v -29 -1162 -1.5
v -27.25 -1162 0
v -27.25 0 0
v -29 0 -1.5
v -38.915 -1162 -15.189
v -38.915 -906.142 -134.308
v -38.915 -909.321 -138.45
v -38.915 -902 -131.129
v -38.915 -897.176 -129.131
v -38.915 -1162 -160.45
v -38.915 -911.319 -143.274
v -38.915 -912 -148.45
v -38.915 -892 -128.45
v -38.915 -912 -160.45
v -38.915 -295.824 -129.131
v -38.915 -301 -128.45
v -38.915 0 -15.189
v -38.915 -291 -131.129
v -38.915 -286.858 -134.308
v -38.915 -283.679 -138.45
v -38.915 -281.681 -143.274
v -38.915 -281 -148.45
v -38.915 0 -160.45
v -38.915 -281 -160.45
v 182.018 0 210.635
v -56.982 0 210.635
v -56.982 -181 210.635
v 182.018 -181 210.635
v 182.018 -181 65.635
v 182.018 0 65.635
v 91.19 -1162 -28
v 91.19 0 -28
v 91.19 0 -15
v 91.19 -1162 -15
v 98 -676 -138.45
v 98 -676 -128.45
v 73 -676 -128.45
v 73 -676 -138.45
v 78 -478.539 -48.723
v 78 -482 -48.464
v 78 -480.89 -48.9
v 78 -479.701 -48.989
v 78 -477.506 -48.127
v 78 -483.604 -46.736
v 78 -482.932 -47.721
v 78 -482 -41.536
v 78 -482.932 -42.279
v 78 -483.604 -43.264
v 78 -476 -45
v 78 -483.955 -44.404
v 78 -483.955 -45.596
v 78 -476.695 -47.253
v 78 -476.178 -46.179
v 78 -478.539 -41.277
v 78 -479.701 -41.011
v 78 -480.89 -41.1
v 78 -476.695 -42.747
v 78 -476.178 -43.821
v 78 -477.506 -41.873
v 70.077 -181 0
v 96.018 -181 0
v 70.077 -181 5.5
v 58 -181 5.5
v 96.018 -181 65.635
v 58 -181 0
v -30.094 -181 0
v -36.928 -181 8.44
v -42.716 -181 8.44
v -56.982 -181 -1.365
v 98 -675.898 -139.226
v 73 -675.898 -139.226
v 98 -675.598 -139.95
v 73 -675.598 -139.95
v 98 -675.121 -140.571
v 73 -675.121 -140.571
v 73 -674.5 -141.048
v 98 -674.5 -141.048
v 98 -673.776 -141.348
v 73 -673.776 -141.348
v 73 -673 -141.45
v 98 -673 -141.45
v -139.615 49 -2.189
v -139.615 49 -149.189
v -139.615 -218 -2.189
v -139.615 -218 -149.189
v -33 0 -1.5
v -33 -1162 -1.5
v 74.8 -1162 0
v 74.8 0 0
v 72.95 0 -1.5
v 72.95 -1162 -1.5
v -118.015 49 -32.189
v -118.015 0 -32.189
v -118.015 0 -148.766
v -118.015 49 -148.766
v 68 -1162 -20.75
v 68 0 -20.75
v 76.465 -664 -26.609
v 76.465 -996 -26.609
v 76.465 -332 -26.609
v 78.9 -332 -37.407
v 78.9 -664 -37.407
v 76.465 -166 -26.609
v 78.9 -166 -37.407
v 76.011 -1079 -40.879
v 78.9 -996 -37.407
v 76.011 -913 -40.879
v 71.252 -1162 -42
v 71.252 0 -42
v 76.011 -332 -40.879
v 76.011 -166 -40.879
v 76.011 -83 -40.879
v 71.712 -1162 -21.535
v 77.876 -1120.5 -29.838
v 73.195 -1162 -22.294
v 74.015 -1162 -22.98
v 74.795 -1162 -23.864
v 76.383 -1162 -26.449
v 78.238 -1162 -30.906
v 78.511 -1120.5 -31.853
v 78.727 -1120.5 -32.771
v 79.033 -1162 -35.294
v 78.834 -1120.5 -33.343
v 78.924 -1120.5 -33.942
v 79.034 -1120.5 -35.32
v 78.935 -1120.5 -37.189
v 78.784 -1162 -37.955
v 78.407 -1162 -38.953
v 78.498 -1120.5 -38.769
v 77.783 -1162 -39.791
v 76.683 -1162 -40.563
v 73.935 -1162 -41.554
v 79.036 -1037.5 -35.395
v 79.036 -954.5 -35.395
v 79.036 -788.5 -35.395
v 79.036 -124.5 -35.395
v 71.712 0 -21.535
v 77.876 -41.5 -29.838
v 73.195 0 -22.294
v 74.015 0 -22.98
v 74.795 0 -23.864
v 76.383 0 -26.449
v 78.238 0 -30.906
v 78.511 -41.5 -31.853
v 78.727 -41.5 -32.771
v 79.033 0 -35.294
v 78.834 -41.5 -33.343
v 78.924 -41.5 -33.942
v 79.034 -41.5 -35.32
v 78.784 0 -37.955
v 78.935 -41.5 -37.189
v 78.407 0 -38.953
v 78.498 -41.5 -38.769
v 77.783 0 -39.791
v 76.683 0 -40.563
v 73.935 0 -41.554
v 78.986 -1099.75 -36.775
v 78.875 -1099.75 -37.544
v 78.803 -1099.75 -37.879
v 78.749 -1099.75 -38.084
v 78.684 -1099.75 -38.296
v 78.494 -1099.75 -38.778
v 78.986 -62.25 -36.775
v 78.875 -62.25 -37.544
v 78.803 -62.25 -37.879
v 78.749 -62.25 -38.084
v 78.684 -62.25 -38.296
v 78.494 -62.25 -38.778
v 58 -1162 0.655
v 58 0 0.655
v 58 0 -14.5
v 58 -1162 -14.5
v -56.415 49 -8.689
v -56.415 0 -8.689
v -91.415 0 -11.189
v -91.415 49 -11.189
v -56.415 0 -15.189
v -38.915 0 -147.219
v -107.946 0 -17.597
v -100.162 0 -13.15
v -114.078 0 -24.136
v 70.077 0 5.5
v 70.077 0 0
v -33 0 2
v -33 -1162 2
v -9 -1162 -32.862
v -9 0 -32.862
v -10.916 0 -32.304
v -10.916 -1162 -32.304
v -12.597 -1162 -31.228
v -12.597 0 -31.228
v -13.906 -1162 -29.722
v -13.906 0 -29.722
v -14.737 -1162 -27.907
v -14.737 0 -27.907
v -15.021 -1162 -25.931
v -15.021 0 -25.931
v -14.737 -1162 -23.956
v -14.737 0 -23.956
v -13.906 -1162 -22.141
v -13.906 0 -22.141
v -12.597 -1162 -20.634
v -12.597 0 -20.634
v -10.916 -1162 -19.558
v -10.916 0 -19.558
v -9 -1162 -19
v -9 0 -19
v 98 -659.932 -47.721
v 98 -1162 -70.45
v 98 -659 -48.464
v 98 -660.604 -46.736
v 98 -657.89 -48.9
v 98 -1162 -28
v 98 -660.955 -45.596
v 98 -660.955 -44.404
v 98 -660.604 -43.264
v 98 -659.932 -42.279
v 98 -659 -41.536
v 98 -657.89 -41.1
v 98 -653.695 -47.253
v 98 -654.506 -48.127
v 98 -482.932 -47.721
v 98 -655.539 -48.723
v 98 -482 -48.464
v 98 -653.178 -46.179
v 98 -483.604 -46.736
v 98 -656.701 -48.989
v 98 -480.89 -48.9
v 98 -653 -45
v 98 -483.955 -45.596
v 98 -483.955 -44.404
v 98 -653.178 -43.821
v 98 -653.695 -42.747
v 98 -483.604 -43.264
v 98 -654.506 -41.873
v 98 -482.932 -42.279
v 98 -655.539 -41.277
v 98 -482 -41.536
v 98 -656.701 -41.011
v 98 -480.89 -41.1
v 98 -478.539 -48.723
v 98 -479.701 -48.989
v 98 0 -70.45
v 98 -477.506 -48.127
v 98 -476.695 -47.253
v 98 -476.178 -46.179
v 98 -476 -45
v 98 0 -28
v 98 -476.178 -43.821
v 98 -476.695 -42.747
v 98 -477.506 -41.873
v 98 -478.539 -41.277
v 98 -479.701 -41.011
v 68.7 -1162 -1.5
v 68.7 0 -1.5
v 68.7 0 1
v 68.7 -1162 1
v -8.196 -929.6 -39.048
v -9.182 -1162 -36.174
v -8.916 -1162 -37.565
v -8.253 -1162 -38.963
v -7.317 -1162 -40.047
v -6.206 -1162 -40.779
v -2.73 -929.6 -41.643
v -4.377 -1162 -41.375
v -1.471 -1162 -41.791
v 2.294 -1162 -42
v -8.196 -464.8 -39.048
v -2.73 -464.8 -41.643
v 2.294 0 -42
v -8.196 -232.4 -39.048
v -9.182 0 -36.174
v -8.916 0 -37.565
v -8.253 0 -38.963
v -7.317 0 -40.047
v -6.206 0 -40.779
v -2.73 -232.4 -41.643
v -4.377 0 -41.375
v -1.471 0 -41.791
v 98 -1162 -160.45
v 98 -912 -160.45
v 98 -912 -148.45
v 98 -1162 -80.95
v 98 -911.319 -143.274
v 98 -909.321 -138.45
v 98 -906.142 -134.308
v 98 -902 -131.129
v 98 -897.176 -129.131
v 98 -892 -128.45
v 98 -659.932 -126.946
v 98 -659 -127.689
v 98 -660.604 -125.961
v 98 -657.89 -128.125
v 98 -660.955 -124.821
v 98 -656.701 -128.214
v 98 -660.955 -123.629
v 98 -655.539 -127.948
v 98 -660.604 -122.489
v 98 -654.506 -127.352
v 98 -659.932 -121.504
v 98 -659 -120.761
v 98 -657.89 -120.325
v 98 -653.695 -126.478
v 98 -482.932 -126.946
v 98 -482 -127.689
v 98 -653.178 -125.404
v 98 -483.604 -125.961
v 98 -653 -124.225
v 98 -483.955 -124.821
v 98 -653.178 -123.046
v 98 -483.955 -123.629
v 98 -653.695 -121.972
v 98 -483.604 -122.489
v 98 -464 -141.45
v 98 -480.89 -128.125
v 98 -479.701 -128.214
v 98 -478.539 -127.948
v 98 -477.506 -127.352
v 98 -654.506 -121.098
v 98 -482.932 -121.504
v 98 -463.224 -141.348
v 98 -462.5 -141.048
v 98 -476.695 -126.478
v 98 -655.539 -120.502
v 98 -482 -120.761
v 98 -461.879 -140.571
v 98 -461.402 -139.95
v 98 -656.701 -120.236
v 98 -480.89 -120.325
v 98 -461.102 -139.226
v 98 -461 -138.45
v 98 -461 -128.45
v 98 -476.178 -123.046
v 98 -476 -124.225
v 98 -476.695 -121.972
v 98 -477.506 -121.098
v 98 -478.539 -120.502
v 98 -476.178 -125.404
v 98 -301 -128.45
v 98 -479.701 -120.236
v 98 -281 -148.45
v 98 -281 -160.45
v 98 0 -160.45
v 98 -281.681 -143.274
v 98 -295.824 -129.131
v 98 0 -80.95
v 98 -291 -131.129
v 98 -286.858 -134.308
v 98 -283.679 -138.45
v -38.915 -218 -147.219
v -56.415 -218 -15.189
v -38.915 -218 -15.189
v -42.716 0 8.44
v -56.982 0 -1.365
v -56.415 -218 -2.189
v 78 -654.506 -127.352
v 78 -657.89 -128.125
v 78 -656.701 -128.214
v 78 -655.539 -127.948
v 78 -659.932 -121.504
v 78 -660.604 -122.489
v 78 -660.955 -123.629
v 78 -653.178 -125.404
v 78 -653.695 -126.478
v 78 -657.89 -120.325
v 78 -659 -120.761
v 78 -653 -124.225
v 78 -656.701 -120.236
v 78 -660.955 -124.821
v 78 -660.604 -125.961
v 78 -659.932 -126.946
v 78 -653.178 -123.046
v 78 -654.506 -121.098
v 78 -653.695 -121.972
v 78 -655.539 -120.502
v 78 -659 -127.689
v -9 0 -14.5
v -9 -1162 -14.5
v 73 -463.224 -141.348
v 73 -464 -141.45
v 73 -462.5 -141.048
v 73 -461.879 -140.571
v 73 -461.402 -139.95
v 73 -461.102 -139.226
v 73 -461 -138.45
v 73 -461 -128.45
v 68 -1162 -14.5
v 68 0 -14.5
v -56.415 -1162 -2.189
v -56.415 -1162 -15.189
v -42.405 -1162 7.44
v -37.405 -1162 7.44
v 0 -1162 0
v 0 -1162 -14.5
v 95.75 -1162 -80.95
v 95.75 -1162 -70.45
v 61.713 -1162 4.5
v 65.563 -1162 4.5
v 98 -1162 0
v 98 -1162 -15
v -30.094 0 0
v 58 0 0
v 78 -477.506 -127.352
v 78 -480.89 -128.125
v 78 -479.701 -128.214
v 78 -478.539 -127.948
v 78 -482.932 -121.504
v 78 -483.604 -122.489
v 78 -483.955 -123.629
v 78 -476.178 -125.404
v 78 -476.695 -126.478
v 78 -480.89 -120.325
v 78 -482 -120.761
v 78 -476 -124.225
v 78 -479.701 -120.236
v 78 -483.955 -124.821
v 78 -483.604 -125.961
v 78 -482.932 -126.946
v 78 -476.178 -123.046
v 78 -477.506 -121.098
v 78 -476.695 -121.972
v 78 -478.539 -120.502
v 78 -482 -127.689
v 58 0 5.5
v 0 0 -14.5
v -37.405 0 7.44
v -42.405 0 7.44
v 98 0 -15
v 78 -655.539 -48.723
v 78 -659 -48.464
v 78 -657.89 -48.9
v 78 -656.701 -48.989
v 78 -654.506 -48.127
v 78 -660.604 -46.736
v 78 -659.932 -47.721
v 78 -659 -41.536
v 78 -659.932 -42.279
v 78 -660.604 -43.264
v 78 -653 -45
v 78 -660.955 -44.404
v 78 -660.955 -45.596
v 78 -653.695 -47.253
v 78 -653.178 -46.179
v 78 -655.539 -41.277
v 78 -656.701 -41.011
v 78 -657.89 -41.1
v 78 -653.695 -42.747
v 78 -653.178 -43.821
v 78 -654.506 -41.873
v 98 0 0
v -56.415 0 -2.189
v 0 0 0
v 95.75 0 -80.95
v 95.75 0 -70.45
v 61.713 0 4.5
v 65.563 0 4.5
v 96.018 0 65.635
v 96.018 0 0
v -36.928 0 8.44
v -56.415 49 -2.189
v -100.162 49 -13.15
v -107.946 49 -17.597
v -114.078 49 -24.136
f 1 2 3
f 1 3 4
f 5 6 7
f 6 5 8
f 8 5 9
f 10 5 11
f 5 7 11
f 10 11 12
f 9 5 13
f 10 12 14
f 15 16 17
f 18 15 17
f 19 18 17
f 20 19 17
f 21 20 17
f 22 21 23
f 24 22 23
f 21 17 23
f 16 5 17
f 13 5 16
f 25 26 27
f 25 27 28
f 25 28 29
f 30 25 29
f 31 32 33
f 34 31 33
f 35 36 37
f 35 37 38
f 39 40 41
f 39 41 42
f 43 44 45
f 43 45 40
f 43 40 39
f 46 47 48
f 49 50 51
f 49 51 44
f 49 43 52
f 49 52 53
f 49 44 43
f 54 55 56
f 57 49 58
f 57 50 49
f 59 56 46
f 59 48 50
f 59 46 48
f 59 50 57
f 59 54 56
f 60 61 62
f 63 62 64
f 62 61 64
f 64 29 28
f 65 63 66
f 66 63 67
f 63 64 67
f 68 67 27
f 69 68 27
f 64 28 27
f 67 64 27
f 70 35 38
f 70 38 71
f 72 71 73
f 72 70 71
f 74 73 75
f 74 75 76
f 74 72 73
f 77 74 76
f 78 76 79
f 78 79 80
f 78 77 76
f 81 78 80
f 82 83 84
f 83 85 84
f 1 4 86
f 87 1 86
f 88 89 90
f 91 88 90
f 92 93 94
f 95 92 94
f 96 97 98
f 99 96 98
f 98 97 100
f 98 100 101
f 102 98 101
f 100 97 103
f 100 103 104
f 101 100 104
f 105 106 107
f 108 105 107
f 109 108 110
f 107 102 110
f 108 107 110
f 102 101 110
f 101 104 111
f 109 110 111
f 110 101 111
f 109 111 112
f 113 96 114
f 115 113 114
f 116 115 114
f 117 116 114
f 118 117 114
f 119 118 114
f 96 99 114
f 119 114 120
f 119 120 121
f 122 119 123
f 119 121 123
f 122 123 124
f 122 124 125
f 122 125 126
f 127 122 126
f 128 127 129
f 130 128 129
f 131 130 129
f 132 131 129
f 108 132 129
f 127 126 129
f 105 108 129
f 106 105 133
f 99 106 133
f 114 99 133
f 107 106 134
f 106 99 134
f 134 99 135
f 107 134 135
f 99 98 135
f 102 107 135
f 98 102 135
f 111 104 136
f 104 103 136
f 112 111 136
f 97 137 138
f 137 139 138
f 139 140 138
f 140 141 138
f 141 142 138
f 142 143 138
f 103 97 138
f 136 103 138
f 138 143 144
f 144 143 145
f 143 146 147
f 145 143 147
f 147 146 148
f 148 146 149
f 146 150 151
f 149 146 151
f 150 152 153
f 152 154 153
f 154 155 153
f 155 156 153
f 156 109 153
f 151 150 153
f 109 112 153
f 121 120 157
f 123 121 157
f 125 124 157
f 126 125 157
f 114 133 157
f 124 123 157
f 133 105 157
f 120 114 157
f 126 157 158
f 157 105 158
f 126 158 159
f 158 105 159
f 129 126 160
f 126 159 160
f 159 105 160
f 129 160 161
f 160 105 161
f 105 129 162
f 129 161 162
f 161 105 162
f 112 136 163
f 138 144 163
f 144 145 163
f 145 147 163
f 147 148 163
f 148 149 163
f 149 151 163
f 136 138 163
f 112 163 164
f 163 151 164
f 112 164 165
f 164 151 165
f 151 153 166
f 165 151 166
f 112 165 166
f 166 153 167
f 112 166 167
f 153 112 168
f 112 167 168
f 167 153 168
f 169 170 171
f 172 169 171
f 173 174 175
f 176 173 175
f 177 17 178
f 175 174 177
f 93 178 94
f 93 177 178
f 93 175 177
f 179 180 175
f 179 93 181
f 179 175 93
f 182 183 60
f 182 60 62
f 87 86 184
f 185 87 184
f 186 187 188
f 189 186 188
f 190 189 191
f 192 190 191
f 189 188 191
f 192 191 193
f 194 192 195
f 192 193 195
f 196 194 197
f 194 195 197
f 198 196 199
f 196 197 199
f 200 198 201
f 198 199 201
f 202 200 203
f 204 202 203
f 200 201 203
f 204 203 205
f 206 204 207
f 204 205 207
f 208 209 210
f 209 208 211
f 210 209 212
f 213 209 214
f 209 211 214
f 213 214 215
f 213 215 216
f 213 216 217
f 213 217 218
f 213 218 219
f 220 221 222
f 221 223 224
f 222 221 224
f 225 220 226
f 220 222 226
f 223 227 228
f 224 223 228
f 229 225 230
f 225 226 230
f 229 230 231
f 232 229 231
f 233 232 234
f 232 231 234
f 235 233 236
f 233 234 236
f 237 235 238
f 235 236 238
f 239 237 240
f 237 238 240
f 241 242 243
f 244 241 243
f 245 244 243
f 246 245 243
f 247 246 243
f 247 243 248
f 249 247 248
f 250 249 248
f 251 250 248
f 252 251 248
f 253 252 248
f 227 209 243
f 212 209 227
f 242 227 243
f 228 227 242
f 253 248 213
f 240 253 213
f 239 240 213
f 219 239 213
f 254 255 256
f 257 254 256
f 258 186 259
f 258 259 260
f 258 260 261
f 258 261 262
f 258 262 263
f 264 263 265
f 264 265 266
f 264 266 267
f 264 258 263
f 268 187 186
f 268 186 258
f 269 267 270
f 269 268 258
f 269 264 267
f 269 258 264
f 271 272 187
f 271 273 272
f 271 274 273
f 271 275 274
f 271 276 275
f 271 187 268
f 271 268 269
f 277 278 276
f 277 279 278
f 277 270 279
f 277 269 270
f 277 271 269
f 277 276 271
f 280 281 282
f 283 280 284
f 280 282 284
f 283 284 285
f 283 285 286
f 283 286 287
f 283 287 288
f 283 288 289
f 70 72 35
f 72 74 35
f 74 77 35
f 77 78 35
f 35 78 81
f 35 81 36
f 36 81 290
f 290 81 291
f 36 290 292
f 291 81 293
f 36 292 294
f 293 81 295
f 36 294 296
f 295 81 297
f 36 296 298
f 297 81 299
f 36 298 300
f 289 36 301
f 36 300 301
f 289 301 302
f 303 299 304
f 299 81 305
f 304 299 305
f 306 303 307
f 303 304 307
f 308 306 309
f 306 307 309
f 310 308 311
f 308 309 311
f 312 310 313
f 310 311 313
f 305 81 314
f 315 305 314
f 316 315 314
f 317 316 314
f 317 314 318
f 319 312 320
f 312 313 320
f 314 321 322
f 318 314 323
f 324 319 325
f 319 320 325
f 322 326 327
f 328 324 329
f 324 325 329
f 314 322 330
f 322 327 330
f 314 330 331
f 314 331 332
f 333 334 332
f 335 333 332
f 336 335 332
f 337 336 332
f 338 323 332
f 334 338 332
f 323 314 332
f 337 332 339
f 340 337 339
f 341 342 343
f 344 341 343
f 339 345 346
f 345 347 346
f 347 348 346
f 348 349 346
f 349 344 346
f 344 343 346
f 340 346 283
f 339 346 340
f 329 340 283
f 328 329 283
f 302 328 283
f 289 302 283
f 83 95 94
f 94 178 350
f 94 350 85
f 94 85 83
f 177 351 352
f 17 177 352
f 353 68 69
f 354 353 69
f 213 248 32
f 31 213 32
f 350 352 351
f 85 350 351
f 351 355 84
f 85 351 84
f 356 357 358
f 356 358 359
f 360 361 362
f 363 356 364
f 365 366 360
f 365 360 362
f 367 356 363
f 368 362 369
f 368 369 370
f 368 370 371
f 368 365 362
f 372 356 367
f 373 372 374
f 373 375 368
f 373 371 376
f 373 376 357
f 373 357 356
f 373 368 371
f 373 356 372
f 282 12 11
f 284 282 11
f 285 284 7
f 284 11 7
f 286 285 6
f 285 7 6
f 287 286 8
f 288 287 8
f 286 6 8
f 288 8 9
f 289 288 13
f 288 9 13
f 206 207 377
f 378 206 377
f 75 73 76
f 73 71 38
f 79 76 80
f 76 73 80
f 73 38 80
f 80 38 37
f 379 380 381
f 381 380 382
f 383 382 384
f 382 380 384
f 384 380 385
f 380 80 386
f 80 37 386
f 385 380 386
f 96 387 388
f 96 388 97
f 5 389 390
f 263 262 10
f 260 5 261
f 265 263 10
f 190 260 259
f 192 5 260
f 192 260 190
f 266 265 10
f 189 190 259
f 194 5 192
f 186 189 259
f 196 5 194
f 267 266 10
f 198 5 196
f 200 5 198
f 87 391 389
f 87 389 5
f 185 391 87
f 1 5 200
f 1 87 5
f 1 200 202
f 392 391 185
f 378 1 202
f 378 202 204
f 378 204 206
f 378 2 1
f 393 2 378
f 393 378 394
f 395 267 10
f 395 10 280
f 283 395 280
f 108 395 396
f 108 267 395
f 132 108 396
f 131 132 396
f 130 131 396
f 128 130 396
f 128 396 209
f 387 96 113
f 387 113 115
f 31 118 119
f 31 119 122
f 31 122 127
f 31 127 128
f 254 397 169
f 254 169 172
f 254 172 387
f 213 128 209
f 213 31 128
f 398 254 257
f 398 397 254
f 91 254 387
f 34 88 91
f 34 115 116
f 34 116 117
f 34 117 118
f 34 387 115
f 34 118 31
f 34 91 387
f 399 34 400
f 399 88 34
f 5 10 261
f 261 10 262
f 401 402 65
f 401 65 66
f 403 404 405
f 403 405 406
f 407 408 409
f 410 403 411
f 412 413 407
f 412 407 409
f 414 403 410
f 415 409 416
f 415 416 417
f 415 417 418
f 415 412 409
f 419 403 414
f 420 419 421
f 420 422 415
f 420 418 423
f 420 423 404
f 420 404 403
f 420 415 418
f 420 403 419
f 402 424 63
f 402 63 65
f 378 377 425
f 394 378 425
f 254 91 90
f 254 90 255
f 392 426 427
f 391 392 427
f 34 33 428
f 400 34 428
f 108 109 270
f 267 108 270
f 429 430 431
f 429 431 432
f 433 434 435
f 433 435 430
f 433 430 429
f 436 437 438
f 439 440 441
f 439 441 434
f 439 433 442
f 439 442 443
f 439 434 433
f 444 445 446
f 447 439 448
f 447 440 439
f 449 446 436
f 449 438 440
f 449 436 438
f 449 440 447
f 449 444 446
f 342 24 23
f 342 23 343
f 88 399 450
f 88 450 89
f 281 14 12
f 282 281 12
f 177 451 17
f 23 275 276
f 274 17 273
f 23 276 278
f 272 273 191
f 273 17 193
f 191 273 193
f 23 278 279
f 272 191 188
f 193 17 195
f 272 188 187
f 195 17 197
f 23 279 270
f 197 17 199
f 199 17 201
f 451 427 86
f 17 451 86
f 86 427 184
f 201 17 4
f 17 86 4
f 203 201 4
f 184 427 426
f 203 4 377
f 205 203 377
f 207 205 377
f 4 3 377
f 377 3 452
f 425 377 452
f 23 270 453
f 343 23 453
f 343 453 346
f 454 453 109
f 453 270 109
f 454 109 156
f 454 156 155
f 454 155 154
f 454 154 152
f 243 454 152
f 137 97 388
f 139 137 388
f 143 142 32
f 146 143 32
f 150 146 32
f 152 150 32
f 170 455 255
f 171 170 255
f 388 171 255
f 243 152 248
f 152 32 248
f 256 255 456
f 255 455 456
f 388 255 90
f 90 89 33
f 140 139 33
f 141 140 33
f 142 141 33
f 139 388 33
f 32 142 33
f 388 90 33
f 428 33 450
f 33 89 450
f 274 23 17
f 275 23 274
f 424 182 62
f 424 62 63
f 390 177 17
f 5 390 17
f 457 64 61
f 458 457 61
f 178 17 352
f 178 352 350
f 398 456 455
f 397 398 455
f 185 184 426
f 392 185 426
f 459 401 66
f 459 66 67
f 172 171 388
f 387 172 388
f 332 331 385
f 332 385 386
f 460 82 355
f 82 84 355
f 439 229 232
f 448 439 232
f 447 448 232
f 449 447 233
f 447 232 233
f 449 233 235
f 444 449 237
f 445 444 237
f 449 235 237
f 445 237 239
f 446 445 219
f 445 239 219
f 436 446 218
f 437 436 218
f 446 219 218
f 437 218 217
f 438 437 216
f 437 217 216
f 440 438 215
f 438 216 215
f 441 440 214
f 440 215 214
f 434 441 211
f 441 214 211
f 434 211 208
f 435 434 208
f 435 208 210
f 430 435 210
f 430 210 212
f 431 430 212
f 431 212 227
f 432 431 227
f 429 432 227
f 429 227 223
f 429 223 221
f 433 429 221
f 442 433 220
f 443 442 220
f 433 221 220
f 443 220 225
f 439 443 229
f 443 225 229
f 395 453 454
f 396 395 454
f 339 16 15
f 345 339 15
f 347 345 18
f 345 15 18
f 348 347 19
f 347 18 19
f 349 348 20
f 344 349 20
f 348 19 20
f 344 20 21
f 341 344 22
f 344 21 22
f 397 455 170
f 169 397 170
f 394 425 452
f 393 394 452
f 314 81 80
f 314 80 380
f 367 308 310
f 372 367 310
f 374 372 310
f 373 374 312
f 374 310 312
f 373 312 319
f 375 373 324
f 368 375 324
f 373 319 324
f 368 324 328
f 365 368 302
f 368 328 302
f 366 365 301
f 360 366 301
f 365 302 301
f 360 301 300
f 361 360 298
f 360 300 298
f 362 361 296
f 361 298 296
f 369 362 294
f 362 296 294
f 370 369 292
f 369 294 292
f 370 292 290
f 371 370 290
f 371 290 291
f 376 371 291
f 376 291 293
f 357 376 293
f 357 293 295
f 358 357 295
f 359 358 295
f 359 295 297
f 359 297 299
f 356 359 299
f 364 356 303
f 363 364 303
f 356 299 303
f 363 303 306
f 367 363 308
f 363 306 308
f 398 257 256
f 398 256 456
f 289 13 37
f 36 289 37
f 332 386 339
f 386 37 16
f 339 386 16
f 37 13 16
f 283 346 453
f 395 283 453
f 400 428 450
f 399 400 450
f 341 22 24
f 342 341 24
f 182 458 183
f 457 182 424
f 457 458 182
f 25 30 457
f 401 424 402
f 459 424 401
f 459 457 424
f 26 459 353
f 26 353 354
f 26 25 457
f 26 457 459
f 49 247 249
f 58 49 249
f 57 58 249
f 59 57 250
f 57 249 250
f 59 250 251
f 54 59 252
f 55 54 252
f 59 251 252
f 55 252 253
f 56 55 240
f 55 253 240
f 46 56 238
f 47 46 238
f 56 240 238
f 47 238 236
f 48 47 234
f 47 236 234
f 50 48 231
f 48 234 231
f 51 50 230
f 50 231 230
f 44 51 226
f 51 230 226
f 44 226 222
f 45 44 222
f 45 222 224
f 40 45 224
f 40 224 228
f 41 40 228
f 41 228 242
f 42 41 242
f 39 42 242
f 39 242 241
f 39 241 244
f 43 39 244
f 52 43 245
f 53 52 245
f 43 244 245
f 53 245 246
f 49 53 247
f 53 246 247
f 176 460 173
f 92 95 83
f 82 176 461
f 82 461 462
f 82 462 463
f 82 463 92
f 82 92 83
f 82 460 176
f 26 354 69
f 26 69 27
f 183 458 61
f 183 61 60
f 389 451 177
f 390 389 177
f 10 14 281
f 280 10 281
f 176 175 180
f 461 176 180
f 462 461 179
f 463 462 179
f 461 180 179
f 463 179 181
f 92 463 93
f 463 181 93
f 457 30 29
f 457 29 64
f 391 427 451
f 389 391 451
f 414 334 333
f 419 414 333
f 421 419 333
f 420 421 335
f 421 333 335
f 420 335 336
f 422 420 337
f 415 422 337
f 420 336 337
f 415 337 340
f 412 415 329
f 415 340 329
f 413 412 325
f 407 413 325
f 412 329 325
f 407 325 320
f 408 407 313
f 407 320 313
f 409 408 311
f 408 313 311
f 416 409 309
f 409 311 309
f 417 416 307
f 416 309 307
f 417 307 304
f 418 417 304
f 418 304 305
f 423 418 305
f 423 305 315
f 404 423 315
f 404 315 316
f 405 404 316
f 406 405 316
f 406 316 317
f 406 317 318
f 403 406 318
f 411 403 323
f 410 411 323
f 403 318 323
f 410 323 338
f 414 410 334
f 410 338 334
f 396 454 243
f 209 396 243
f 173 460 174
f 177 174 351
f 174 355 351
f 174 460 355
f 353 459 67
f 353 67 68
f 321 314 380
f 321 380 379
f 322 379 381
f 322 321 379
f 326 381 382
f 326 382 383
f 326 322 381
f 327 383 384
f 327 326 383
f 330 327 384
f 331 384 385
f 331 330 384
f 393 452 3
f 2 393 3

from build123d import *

# Parameters (mm, degrees)
F1_DEPTH  = 1162
F3_DEPTH  = 136.9153879439
F5_DEPTH  = 25
F4_R      = 4
F6_DEPTH  = 20
F8_DEPTH  = 218
F9_DEPTH  = 49
F11_DEPTH = 181


with BuildPart() as f1:
    # F0 (on Front) → F1 (new body)
    with BuildSketch(Plane.XZ):
        with BuildLine():
            Line((98, -15), (98, 0))
            Line((98, 0), (74.8, 0))
            Line((74.8, 0), (72.95, -1.5))
            Line((72.95, -1.5), (68.7, -1.5))
            Line((68.7, -1.5), (68.7, 1))
            Line((68.7, 1), (65.5631225717, 4.5))
            Line((65.5631225717, 4.5), (61.7131225717, 4.5))
            Line((61.7131225717, 4.5), (58, 0.6549490182))
            Line((58, 0.6549490182), (58, -14.5))
            Line((58, -14.5), (68, -14.5))
            Line((68, -14.5), (68, -20.75))
            add(Edge.make_bspline(
                [(68, -20.75), (69.7820021938, -21.0035260588), (73.4163773468, -21.5186921977), (76.6094071106, -26.4212132096), (79.0240865965, -32.5288945488), (79.1651134516, -37.3427034629), (77.9902378945, -40.2318102544), (74.2121223578, -41.5777983629), (72.5005865097, -41.8714731932), (71.2516382337, -42)],
                knots=[0, 0, 0, 0, 0.1544028345, 0.3136194875, 0.4894601632, 0.6362516526, 0.7501048386, 0.8792903413, 1, 1, 1, 1], degree=3))
            Line((71.2516382337, -42), (2.2936949972, -42))
            add(Edge.make_bspline(
                [(-9, -32.8624588123), (-9.1921132317, -34.4261774169), (-9.5130067032, -37.3021134827), (-7.0322735848, -41.0080368508), (-2.7715139126, -41.668724359), (0.006287842, -41.9485204029), (1.3987936545, -41.956756264), (2.2936949972, -42)],
                knots=[0, 0, 0, 0, 0.225977562, 0.4398697973, 0.6588323509, 0.8370166765, 1, 1, 1, 1], degree=3))
            ThreePointArc((-9, -32.8624588123), (-15.0211951577, -25.9312294062), (-9, -19))
            Line((-9, -19), (-9, -14.5))
            Line((-9, -14.5), (0, -14.5))
            Line((0, -14.5), (0, 0))
            Line((0, 0), (-27.25, 0))
            Line((-27.25, 0), (-29, -1.5))
            Line((-29, -1.5), (-33, -1.5))
            Line((-33, -1.5), (-33, 2))
            Line((-33, 2), (-37.4052427373, 7.4400217302))
            Line((-37.4052427373, 7.4400217302), (-42.4052427373, 7.4400217302))
            Line((-42.4052427373, 7.4400217302), (-56.4153879439, -2.1888842975))
            Line((-56.4153879439, -2.1888842975), (-56.4153879439, -15.1888842975))
            Line((-56.4153879439, -15.1888842975), (-38.9153879439, -15.1888842975))
            Line((-38.9153879439, -15.1888842975), (-38.9153879439, -97.1870198846))
            Line((-38.9153879439, -97.1870198846), (-38.9153879439, -160.45))
            Line((-38.9153879439, -160.45), (98, -160.45))
            Line((98, -160.45), (98, -80.95))
            Line((98, -80.95), (95.75, -80.95))
            Line((95.75, -80.95), (95.75, -70.45))
            Line((95.75, -70.45), (98, -70.45))
            Line((98, -70.45), (98, -28))
            Line((98, -28), (91.19, -28))
            Line((91.19, -28), (91.19, -15))
            Line((91.19, -15), (98, -15))
        make_face()
    extrude(amount=F1_DEPTH)

    # F2 (on face) → F3 (cut, through all)
    with BuildSketch(Plane(origin=(-38.9153879439, 0, 0), x_dir=(0, -1, 0), z_dir=(-1, 0, 0))):
        with BuildLine():
            Line((281, -160.45), (912, -160.45))
            Line((912, -160.45), (912, -148.45))
            ThreePointArc((912, -148.45), (906.1421356237, -134.3078643763), (892, -128.45))
            Line((892, -128.45), (301, -128.45))
            ThreePointArc((301, -128.45), (286.8578643763, -134.3078643763), (281, -148.45))
            Line((281, -148.45), (281, -160.45))
        make_face()
    extrude(amount=-F3_DEPTH, mode=Mode.SUBTRACT)

    # F4 (on face) → F5 (join)
    with BuildSketch(Plane.YZ.offset(98)):
        with BuildLine():
            Line((-673, -141.45), (-657, -141.45))
            Line((-657, -141.45), (-480, -141.45))
            Line((-480, -141.45), (-464, -141.45))
            ThreePointArc((-464, -141.45), (-461.8786796564, -140.5713203436), (-461, -138.45))
            Line((-461, -138.45), (-461, -128.45))
            Line((-461, -128.45), (-676, -128.45))
            Line((-676, -128.45), (-676, -138.45))
            ThreePointArc((-676, -138.45), (-675.1213203436, -140.5713203436), (-673, -141.45))
        make_face()
    extrude(amount=-F5_DEPTH)

    # F4 (on face) → F6 (cut)
    with BuildSketch(Plane.YZ.offset(98)):
        with Locations((-657, -45)):
            Circle(F4_R)
        with Locations((-480, -45)):
            Circle(F4_R)
        with Locations((-480, -124.225)):
            Circle(F4_R)
        with Locations((-657, -124.225)):
            Circle(F4_R)
    extrude(amount=-F6_DEPTH, mode=Mode.SUBTRACT)


with BuildPart() as f8:
    # F7 (on face) → F8 (new body)
    with BuildSketch(Plane(origin=(0, 0, 0), x_dir=(-1, 0, 0), z_dir=(0, 1, 0))):
        with BuildLine():
            Line((56.4153879439, -8.6888842975), (56.4153879439, -15.1888842975))
            Line((56.4153879439, -15.1888842975), (38.9153879439, -15.1888842975))
            Line((38.9153879439, -15.1888842975), (38.9153879439, -147.219017148))
            Line((38.9153879439, -147.219017148), (118.0153879439, -148.7663507282))
            Line((118.0153879439, -148.7663507282), (118.0153879439, -32.1888842975))
            ThreePointArc((118.0153879439, -32.1888842975), (107.9460657445, -17.5966924168), (91.4153879439, -11.1888842975))
            Line((91.4153879439, -11.1888842975), (56.4153879439, -8.6888842975))
        make_face()
        Polygon((56.4153879439, -2.1888842975), (56.4153879439, -8.6888842975), (91.4153879439, -11.1888842975), (91.4153879439, -2.1888842975), align=None)
        with BuildLine():
            Line((91.4153879439, -2.1888842975), (91.4153879439, -11.1888842975))
            ThreePointArc((91.4153879439, -11.1888842975), (107.9460657445, -17.5966924168), (118.0153879439, -32.1888842975))
            Line((118.0153879439, -32.1888842975), (118.0153879439, -2.1888842975))
            Line((118.0153879439, -2.1888842975), (91.4153879439, -2.1888842975))
        make_face()
        Polygon((118.0153879439, -32.1888842975), (118.0153879439, -148.7663507282), (139.6153879439, -149.1888842975), (139.6153879439, -2.1888842975), (118.0153879439, -2.1888842975), align=None)
    extrude(amount=-F8_DEPTH)

    # F7 (on face) → F9 (join)
    with BuildSketch(Plane(origin=(0, 0, 0), x_dir=(-1, 0, 0), z_dir=(0, 1, 0))):
        Polygon((118.0153879439, -32.1888842975), (118.0153879439, -148.7663507282), (139.6153879439, -149.1888842975), (139.6153879439, -2.1888842975), (118.0153879439, -2.1888842975), align=None)
        with BuildLine():
            Line((91.4153879439, -2.1888842975), (91.4153879439, -11.1888842975))
            ThreePointArc((91.4153879439, -11.1888842975), (107.9460657445, -17.5966924168), (118.0153879439, -32.1888842975))
            Line((118.0153879439, -32.1888842975), (118.0153879439, -2.1888842975))
            Line((118.0153879439, -2.1888842975), (91.4153879439, -2.1888842975))
        make_face()
        Polygon((56.4153879439, -2.1888842975), (56.4153879439, -8.6888842975), (91.4153879439, -11.1888842975), (91.4153879439, -2.1888842975), align=None)
    extrude(amount=F9_DEPTH)


with BuildPart() as f11:
    # F10 (on face) → F11 (new body)
    with BuildSketch(Plane(origin=(0, 0, 0), x_dir=(-1, 0, 0), z_dir=(0, 1, 0))):
        Polygon((-58, 0), (0, 0), (27.25, 0), (30.0936723677, 0), (36.9282672047, 8.4400217302), (42.7157509908, 8.4400217302), (56.9817941808, -1.3647581089), (56.9817941808, 210.6352418911), (-182.0182058192, 210.6352418911), (-182.0182058192, 65.6352418911), (-96.0182058192, 65.6352418911), (-96.0182058192, 0), (-74.8, 0), (-70.0774118304, 0), (-70.0774118304, 5.5), (-68.7, 5.5), (-58, 5.5), (-58, 0.6549490182), align=None)
    extrude(amount=-F11_DEPTH)


solid = Compound([f1.part, f8.part, f11.part])
